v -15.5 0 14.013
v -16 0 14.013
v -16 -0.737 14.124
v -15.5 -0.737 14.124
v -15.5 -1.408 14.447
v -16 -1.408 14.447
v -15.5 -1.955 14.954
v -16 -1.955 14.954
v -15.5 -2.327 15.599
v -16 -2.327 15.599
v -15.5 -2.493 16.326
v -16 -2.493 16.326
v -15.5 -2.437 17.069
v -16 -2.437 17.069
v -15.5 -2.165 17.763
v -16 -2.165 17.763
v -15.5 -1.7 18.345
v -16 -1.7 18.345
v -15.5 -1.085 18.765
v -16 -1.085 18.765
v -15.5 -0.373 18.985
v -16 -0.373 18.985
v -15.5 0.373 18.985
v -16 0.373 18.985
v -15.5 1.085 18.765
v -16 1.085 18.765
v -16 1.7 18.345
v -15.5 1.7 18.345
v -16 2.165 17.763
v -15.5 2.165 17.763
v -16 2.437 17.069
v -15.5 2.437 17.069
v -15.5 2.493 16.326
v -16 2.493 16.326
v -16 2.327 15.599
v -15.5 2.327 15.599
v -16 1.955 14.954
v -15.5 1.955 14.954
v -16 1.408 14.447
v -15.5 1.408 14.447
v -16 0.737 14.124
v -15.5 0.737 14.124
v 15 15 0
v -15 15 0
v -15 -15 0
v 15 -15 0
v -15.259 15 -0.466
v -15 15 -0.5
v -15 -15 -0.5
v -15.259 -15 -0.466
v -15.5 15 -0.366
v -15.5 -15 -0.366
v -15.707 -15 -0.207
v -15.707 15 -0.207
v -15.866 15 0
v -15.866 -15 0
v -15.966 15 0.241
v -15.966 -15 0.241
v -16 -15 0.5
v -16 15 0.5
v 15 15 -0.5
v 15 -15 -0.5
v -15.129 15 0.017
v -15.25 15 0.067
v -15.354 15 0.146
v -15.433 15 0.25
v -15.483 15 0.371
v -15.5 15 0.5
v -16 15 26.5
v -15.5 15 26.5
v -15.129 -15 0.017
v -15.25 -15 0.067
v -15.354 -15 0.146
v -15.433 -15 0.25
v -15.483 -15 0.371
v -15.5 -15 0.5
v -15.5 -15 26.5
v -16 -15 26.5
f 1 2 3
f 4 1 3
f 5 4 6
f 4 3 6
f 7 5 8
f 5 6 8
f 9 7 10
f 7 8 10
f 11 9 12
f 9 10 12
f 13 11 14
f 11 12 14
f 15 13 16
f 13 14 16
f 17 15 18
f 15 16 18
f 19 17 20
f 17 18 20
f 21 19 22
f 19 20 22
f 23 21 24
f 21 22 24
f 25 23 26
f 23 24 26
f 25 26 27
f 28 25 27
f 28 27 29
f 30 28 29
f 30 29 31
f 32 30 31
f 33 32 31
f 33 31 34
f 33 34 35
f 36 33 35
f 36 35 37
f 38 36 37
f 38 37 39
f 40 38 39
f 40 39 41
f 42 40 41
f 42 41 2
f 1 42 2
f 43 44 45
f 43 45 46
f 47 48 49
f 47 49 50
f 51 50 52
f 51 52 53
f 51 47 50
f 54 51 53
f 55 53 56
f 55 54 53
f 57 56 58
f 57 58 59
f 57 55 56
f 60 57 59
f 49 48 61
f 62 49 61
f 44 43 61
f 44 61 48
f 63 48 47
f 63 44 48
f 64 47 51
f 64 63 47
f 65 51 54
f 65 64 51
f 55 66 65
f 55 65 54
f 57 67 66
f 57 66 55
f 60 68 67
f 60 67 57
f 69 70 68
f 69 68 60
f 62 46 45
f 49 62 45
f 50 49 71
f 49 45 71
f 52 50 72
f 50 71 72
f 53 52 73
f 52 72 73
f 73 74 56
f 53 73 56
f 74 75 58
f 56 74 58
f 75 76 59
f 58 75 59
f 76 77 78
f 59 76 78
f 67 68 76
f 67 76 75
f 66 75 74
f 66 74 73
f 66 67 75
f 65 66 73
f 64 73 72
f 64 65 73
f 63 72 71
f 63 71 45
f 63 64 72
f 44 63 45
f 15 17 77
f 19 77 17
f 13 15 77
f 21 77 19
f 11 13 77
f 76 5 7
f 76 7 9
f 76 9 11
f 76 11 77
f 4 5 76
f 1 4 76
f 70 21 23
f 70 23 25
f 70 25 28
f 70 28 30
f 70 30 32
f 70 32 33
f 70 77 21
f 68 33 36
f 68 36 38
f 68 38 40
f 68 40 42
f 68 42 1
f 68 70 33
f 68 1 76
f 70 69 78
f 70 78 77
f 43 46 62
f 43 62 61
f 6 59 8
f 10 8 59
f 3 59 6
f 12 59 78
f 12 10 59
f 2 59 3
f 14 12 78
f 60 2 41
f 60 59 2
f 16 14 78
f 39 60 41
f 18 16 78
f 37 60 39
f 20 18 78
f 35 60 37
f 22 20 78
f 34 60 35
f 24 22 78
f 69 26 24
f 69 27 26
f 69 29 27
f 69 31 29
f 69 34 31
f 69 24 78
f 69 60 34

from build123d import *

# Parameters (mm, degrees)
SKETCH_1_W             = 30
SKETCH_1_H             = 30
SM_BASE_FLANGE_1_DEPTH = 0.5
SM_EDGE_FLANGE_1_DEPTH = 30
HOLE_WIZARD_M6_1_D     = 5
HOLE_WIZARD_M6_1_DEPTH = 15
HOLE_WIZARD_M6_1_TIP   = 1.502151548


# Sheet-metal steps are written as plain solids
with BuildPart() as part:
    # Sketch 1 → 基体-法兰1 (new body)
    with BuildSketch(Plane.XY):
        Rectangle(SKETCH_1_W, SKETCH_1_H)
    extrude(amount=-SM_BASE_FLANGE_1_DEPTH)

    # 边线-法兰1 section (across the edge) → 边线-法兰1 (add)
    with BuildSketch(Plane(origin=(-15.5, 15, 0), x_dir=(1, 0, 0), z_dir=(0, -1, 0))):
        with BuildLine():
            Line((-0.5, 0.5), (-0.5, 26.5))
            Line((-0.5, 26.5), (0, 26.5))
            Line((0, 26.5), (0, 0.5))
            ThreePointArc((0, 0.5), (0.146446609, 0.146446609), (0.5, 0))
            Line((0.5, 0), (0.5, -0.5))
            ThreePointArc((0.5, -0.5), (-0.207106781, -0.207106781), (-0.5, 0.5))
        make_face()
    extrude(amount=SM_EDGE_FLANGE_1_DEPTH)

    # M6 螺纹孔的螺纹孔钻头1
    with Locations(Plane(origin=(-15.5, 0, 16.512507822), x_dir=(0, 0, 1), z_dir=(1, 0, 0))):
        with Locations((0, 0)):
            Hole(HOLE_WIZARD_M6_1_D / 2, depth=HOLE_WIZARD_M6_1_DEPTH)
            with Locations((0, 0, -(HOLE_WIZARD_M6_1_DEPTH + HOLE_WIZARD_M6_1_TIP / 2))):  # 118° drill point
                Cone(0, HOLE_WIZARD_M6_1_D / 2, HOLE_WIZARD_M6_1_TIP, mode=Mode.SUBTRACT)


solid = part.part
